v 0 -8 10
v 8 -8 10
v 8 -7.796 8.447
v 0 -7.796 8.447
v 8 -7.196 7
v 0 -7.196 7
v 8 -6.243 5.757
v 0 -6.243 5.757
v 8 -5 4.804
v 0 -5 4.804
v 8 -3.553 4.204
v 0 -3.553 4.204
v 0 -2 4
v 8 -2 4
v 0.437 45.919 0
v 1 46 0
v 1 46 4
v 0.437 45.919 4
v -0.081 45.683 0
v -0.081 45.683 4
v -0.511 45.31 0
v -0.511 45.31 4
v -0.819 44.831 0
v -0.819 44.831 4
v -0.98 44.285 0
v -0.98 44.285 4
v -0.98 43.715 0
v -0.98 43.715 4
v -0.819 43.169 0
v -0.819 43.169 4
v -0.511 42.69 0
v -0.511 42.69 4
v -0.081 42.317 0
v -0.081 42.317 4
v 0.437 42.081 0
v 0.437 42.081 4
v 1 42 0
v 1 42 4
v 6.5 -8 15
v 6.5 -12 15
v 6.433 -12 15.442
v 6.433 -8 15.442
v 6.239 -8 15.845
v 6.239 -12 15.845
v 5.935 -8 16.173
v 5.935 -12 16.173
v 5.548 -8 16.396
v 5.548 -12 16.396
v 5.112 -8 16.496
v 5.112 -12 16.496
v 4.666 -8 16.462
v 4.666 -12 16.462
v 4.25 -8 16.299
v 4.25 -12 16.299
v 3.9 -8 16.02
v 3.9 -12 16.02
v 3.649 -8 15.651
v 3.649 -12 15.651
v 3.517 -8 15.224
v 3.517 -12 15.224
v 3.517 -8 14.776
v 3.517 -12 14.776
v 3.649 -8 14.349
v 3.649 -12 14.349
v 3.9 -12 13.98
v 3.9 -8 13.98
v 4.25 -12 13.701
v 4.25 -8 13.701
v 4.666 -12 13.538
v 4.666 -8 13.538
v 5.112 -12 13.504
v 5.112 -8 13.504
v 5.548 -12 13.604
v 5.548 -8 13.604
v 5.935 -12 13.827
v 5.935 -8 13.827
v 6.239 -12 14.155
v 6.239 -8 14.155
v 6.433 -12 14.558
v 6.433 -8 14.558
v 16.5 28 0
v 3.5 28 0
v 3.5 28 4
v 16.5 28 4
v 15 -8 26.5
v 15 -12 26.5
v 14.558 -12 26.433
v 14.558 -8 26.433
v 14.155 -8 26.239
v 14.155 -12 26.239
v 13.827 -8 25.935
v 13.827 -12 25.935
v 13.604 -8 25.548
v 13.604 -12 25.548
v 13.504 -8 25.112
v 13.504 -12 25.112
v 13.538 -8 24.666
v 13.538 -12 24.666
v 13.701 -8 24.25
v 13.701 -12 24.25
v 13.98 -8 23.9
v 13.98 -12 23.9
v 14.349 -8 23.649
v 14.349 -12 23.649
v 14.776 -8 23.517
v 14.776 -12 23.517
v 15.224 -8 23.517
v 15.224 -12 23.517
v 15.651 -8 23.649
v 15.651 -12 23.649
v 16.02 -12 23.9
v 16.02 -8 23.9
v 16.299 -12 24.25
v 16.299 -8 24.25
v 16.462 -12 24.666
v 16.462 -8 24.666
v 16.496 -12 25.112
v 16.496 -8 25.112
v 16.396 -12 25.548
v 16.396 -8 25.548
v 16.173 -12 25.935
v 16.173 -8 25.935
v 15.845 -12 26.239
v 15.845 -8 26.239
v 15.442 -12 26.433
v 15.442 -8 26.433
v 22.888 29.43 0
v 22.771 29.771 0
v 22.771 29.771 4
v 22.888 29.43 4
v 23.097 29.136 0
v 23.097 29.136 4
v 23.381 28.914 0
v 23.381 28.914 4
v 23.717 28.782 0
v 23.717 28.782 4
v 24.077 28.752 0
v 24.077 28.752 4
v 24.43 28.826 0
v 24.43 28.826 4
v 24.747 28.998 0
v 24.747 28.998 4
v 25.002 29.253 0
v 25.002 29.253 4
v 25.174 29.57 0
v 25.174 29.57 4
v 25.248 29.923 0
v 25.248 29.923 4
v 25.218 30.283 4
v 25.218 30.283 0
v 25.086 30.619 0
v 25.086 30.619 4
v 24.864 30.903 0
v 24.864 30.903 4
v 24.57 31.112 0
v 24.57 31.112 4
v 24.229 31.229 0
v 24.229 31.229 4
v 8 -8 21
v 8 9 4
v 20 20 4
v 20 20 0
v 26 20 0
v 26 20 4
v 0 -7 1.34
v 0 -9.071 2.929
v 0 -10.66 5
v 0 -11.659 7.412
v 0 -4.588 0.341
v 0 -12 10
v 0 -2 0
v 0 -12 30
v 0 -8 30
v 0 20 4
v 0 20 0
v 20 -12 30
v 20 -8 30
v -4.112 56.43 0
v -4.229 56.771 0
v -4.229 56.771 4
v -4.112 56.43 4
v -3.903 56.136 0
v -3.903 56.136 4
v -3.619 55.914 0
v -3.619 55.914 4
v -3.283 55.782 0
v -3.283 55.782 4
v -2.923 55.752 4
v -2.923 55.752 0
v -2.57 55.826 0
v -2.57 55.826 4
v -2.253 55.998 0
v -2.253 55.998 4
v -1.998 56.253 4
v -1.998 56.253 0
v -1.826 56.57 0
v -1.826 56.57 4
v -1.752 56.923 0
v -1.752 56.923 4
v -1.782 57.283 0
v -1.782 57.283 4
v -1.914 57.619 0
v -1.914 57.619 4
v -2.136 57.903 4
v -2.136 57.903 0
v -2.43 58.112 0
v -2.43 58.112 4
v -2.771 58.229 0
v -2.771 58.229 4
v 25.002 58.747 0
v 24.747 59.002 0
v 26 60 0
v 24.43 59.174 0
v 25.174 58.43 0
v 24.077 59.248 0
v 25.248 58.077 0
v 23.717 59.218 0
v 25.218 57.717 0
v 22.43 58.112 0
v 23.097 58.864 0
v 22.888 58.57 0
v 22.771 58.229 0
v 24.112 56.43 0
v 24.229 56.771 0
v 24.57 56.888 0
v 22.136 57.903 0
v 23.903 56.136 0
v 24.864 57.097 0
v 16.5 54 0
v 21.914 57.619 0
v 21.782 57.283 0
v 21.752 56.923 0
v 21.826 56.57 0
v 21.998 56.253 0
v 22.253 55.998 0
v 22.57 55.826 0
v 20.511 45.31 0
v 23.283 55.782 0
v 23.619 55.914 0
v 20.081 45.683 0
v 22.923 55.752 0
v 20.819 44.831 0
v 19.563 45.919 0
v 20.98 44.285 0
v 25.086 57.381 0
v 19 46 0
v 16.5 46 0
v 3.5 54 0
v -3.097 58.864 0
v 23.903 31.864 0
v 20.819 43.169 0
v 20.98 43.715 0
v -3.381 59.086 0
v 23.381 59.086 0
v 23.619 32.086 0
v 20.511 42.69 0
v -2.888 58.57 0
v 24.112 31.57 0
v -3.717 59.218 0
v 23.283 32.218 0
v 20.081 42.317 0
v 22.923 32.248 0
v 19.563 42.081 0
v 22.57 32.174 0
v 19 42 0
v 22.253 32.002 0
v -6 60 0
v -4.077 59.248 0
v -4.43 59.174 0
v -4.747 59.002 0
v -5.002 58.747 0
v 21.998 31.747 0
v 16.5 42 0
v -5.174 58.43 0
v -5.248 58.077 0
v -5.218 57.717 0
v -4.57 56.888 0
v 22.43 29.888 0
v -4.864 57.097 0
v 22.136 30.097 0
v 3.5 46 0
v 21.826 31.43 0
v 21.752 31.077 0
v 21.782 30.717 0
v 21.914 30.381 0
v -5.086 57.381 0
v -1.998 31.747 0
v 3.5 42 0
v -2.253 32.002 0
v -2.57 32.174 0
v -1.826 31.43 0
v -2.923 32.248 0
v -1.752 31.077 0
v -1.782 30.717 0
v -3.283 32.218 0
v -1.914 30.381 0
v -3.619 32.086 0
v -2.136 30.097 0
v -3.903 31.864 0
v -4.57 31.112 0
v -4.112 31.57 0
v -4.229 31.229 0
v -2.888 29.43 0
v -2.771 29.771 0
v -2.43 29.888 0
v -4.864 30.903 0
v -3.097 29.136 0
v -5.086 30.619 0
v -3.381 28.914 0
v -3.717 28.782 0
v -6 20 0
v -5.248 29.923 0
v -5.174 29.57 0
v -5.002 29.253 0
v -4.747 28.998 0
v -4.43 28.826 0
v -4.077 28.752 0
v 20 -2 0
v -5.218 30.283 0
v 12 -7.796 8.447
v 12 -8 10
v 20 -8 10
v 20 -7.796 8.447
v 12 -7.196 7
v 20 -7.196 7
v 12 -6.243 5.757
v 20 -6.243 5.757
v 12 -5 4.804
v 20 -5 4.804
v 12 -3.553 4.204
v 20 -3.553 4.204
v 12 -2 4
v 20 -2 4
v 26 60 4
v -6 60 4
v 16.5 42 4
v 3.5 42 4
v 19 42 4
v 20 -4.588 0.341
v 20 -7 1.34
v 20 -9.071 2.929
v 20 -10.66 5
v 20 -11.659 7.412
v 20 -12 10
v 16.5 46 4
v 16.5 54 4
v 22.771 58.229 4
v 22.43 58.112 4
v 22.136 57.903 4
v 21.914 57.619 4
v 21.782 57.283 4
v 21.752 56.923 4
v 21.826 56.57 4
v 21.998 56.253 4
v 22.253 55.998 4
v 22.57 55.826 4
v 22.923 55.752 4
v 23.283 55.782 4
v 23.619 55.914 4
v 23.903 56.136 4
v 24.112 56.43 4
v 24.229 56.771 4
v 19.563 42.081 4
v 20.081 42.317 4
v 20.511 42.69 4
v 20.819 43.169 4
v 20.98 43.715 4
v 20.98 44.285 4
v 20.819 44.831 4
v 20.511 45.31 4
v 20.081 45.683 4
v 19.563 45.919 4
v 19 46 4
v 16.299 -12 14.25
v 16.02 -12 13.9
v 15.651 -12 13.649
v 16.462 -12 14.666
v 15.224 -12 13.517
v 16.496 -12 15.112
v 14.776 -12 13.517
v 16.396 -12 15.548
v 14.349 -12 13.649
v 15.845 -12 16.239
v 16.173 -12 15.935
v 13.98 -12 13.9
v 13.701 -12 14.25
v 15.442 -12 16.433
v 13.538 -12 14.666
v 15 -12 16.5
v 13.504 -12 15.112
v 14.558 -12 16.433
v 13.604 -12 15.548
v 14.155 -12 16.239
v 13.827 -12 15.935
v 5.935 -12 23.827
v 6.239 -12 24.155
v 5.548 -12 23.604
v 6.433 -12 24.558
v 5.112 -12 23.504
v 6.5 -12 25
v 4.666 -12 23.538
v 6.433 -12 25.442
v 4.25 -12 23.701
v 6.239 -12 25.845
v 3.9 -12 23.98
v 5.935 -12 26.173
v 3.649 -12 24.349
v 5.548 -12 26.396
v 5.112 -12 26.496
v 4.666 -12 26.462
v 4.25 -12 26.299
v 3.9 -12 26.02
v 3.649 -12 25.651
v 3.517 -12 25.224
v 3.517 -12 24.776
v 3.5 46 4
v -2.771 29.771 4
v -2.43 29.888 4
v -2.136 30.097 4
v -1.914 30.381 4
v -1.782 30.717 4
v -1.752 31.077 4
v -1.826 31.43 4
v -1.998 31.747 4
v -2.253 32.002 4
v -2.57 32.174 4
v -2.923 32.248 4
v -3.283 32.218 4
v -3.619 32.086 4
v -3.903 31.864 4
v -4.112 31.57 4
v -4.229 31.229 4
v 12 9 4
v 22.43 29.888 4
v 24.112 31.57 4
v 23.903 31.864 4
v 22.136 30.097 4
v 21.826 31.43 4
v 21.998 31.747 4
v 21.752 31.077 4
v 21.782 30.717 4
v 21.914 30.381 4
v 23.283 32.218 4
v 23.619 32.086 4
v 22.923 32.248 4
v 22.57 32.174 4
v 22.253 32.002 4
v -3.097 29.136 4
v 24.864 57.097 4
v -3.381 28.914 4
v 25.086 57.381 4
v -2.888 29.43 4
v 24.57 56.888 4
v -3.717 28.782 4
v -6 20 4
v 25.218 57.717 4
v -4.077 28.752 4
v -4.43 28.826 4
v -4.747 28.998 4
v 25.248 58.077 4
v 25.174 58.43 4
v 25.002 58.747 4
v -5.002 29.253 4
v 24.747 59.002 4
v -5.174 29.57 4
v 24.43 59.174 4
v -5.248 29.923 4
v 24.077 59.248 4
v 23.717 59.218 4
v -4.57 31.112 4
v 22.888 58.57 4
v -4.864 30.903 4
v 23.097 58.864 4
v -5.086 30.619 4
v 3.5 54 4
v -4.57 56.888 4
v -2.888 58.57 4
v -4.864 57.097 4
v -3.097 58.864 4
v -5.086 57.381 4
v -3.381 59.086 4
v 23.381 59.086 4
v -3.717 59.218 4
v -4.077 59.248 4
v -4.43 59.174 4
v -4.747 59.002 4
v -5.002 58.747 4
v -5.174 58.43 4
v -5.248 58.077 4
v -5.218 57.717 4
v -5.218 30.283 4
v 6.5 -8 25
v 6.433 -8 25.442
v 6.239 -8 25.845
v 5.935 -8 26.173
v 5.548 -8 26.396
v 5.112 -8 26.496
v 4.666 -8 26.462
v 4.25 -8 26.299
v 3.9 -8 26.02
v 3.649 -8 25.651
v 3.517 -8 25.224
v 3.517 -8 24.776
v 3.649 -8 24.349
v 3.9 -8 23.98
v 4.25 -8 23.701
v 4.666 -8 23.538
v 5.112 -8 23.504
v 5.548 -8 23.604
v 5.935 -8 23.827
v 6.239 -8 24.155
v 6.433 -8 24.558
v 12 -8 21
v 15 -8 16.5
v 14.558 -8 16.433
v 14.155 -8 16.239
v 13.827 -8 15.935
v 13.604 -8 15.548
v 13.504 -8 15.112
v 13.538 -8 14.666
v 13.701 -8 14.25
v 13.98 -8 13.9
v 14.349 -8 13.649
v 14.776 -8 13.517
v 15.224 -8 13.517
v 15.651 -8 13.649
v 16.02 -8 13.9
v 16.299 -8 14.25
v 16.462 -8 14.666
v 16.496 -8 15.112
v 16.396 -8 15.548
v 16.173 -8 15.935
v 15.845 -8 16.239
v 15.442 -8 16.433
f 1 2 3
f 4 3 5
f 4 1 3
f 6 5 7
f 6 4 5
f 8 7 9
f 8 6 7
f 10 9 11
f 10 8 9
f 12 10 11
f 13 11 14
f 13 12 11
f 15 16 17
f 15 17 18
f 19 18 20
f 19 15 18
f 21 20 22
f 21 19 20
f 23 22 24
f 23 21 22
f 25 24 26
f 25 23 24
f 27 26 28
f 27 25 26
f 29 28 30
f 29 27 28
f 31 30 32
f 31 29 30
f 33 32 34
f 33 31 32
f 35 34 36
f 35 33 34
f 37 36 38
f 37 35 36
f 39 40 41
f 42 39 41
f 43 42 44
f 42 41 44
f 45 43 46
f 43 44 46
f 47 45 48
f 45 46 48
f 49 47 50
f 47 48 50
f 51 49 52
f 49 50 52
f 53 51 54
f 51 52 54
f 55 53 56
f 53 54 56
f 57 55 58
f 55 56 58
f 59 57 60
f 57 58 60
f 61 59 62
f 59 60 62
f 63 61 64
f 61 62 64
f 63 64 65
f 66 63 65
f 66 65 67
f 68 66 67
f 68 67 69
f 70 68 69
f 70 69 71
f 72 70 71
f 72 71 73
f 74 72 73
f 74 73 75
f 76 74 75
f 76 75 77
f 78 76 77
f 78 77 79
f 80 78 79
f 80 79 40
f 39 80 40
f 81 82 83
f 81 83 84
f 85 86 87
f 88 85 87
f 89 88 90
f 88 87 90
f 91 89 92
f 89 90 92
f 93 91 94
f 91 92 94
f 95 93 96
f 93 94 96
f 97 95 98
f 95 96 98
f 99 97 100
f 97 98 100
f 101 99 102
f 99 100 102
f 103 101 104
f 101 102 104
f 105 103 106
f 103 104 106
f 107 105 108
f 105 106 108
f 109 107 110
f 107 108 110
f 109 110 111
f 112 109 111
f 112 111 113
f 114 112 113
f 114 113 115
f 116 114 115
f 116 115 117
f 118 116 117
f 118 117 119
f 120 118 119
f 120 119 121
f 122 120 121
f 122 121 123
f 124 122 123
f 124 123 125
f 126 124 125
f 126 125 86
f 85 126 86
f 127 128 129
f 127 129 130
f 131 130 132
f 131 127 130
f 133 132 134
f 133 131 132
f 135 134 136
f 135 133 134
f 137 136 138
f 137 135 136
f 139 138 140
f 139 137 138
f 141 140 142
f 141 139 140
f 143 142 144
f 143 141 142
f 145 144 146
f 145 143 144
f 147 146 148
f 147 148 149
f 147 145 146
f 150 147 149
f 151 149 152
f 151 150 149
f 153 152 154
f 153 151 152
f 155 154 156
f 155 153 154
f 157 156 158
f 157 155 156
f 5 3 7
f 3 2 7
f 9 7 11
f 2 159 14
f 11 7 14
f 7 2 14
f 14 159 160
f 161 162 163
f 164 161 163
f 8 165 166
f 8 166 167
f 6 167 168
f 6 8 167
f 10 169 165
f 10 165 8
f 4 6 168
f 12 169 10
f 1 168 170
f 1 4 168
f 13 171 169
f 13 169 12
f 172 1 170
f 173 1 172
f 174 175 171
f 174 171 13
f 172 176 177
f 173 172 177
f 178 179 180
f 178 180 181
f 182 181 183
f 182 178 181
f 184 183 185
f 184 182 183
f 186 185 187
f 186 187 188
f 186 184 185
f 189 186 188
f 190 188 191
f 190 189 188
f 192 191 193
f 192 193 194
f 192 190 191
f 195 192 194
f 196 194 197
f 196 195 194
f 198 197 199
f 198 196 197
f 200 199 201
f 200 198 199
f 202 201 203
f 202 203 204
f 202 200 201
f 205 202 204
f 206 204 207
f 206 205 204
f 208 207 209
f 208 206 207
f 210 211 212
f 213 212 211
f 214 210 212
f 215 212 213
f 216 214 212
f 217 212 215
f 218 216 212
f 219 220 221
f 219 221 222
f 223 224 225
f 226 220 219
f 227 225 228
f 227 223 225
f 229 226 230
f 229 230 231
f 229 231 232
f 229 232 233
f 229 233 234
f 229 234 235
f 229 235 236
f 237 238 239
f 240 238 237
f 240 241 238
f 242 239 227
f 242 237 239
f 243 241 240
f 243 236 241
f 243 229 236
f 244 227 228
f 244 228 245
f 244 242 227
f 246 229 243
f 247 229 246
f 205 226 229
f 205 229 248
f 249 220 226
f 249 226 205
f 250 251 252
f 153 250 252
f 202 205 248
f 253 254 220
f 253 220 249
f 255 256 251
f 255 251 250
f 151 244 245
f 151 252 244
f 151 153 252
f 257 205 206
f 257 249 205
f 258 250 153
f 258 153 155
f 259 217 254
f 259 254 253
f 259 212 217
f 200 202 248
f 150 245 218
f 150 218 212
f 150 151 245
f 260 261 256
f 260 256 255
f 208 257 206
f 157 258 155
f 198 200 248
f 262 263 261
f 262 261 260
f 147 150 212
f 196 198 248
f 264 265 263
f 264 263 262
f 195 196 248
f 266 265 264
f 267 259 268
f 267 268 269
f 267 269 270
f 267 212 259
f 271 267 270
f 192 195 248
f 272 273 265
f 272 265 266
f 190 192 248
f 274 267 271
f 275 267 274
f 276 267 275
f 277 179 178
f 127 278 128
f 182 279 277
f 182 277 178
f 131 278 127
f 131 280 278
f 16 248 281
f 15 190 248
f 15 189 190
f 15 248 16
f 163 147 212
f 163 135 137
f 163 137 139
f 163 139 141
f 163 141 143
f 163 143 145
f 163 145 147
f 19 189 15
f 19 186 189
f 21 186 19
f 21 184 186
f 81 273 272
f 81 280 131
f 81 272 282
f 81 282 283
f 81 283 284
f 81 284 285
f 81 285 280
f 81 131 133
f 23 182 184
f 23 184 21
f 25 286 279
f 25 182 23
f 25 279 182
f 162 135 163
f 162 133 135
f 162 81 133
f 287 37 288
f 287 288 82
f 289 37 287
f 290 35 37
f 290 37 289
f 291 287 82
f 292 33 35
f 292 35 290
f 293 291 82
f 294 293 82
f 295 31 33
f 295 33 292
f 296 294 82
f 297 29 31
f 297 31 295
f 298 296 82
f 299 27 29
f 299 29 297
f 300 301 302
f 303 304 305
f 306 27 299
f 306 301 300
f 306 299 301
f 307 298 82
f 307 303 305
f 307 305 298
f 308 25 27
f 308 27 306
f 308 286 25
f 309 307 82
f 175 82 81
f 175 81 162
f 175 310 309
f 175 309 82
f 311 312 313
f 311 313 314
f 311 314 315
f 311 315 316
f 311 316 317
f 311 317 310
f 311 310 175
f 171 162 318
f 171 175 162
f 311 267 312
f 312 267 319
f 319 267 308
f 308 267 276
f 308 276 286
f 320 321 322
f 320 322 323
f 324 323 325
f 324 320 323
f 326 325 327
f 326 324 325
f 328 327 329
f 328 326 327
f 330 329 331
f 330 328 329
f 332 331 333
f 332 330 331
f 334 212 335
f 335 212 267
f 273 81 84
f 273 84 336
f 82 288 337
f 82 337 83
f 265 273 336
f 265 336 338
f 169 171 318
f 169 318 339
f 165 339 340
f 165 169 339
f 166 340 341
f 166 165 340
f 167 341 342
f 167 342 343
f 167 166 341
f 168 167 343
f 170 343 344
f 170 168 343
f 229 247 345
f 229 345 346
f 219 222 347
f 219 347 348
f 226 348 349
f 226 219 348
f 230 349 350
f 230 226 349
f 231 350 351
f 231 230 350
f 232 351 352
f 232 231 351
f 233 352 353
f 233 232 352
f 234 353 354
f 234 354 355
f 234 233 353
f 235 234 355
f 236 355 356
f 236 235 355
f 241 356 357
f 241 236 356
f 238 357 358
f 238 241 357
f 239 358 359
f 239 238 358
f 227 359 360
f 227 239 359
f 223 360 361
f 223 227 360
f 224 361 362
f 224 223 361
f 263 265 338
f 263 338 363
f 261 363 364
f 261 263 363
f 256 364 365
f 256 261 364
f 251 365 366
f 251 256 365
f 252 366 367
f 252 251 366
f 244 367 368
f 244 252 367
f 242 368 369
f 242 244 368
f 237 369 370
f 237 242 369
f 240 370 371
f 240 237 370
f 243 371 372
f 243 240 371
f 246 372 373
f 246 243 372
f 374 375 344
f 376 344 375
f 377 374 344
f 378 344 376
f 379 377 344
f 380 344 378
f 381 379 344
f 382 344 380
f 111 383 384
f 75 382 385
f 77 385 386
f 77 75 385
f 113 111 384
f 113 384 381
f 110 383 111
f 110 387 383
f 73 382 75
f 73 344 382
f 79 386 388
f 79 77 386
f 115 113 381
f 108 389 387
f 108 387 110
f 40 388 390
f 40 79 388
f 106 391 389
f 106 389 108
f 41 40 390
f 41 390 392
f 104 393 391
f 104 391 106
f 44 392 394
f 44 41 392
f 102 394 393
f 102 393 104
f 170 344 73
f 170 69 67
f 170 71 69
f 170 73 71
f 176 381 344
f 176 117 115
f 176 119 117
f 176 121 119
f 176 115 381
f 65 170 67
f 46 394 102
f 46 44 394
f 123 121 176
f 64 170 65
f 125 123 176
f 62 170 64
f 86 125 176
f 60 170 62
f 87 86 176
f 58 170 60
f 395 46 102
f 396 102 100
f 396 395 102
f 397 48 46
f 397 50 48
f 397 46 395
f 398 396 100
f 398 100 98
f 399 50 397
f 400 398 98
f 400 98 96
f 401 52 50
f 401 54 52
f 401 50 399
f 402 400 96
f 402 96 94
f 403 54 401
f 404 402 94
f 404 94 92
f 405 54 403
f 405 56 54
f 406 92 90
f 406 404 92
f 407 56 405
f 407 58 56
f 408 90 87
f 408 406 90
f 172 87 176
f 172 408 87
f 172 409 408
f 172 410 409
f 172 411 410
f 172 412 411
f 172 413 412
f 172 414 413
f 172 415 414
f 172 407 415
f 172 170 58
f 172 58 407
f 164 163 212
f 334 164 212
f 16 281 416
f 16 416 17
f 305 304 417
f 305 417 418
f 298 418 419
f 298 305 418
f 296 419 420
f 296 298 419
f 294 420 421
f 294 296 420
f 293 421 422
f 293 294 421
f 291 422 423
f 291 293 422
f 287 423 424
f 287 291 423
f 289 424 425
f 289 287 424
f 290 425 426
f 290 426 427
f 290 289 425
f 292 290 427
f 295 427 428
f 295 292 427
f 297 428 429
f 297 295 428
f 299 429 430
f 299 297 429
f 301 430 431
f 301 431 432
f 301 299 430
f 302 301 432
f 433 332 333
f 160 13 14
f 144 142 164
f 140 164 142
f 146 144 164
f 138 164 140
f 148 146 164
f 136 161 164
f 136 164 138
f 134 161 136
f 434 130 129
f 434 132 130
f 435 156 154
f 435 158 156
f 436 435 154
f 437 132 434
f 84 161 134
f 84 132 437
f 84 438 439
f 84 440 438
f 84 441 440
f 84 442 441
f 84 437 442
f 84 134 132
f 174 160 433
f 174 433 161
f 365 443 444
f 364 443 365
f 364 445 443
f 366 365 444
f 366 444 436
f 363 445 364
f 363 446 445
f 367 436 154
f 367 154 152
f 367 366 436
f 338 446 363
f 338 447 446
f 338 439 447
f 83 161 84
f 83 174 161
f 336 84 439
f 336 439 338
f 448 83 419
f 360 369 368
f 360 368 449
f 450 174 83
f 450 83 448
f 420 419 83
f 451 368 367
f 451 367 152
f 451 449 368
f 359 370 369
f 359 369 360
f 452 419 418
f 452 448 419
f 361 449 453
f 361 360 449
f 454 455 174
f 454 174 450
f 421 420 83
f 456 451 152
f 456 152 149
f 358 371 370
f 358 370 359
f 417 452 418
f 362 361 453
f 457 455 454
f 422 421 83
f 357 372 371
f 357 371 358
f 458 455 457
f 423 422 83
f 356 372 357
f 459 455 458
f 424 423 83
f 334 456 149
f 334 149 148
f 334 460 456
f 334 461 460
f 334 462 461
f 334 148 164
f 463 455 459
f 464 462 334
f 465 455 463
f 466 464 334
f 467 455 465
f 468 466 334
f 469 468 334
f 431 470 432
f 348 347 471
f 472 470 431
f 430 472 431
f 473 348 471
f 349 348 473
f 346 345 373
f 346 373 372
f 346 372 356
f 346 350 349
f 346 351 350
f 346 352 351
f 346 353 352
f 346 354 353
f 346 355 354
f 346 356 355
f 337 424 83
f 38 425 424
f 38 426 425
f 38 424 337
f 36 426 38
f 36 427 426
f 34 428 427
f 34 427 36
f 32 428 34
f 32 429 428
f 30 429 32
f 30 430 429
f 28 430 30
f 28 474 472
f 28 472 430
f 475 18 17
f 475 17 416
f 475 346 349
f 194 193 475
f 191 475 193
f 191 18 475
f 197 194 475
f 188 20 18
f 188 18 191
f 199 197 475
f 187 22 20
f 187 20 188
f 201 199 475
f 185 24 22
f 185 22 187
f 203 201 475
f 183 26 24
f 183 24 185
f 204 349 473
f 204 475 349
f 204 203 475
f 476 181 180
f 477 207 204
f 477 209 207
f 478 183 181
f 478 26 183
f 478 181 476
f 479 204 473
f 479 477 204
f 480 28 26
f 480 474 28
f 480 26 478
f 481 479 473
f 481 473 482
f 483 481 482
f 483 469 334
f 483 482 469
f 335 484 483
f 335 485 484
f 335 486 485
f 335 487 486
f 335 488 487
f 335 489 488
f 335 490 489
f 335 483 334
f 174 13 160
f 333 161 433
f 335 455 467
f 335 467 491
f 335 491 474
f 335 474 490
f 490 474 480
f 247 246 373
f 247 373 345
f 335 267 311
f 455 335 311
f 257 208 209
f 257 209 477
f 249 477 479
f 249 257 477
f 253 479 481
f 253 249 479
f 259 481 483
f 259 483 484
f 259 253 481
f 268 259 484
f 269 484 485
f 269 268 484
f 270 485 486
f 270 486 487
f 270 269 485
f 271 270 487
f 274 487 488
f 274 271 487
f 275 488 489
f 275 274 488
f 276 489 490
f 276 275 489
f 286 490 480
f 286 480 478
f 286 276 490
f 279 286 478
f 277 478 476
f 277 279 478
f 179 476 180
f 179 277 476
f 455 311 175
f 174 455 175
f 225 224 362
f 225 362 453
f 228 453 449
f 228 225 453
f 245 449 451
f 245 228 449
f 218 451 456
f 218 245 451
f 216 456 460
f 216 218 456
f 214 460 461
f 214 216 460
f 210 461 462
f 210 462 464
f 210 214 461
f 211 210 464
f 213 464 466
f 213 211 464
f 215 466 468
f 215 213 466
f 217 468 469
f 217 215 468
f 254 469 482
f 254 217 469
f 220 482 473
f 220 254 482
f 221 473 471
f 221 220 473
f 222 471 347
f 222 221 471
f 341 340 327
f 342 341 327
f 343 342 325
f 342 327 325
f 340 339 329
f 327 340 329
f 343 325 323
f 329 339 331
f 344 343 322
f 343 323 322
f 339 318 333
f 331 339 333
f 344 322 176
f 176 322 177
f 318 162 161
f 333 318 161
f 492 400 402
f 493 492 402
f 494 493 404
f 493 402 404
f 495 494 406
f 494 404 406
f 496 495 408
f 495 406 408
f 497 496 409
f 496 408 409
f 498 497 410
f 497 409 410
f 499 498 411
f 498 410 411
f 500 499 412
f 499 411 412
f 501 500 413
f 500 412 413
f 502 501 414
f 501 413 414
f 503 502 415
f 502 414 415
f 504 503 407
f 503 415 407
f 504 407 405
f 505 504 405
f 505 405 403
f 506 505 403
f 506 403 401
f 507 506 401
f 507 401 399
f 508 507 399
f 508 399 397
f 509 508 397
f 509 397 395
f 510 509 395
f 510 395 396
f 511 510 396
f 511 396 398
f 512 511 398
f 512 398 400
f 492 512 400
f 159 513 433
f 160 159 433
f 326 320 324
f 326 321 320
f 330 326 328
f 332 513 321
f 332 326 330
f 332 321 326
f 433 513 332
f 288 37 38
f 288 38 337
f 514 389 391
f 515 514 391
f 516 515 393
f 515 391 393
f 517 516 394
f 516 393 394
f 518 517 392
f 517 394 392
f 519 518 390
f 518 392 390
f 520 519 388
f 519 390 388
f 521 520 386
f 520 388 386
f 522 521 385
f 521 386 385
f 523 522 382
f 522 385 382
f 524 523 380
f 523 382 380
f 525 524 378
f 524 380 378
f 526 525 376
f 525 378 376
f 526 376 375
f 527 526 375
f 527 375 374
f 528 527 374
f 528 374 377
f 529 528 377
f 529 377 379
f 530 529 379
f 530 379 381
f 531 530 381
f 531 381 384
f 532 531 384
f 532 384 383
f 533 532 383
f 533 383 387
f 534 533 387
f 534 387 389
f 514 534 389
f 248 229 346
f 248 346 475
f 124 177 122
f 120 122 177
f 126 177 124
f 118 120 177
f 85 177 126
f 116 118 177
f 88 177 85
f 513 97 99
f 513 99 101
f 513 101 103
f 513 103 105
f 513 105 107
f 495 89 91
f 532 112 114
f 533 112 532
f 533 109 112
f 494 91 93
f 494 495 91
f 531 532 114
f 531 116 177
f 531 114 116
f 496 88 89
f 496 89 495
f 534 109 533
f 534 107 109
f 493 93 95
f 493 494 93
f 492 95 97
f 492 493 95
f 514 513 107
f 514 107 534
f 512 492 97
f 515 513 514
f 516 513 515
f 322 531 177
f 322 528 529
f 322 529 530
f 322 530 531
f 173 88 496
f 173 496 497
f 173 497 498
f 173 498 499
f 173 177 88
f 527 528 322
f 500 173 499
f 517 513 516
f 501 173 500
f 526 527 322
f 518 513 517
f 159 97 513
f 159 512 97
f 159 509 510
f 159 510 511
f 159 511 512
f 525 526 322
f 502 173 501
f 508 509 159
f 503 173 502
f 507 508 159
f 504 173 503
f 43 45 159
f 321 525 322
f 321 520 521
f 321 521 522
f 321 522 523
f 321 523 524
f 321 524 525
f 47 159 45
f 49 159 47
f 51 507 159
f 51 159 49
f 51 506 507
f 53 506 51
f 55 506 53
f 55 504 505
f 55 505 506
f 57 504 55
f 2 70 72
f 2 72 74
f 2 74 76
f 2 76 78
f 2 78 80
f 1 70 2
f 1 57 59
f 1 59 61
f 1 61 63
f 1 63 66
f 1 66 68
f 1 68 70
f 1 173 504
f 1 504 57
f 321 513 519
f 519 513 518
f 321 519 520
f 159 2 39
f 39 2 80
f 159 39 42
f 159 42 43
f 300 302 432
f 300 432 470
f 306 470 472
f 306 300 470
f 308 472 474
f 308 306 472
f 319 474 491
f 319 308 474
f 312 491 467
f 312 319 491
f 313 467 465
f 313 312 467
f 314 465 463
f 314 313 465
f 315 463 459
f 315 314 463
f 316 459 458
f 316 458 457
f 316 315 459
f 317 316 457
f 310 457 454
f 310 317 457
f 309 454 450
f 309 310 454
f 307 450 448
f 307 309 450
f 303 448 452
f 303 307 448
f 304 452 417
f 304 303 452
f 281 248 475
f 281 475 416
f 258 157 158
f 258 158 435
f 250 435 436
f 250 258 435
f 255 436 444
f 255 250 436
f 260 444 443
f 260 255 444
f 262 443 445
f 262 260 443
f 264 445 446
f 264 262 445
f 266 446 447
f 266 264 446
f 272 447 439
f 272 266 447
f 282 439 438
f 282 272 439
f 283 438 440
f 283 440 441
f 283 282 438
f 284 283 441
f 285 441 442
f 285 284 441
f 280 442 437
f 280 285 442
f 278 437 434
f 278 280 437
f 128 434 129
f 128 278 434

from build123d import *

# Parameters (mm, degrees)
EXTRUDE_1_DEPTH     = 4
EXTRUDE_3_DEPTH     = 20
RIB_1_REACH         = 70.964
SKETCH_5_WALL_W     = 163.463051102
SKETCH_5_WALL_H     = 4
SKETCH_6_R          = 1.5
CUT_EXTRUDE_3_DEPTH = 10


with BuildPart() as part:
    # 草图1 → 凸台-拉伸1 (new body)
    with BuildSketch(Plane.XY):
        Polygon((0, 20), (0, 0), (20, 0), (20, 20), (26, 20), (26, 60), (-6, 60), (-6, 20), align=None)
        with BuildLine():
            Line((3.5, 54), (3.5, 46))
            Line((3.5, 46), (1, 46))
            ThreePointArc((1, 46), (-1, 44), (1, 42))
            Line((1, 42), (3.5, 42))
            Line((3.5, 42), (3.5, 28))
            Line((3.5, 28), (16.5, 28))
            Line((16.5, 28), (16.5, 42))
            Line((16.5, 42), (19, 42))
            ThreePointArc((19, 42), (21, 44), (19, 46))
            Line((19, 46), (16.5, 46))
            Line((16.5, 46), (16.5, 54))
            Line((16.5, 54), (3.5, 54))
        make_face(mode=Mode.SUBTRACT)
        with BuildLine():
            ThreePointArc((24.228868987, 56.771131013), (24.883883476, 58.883883476), (22.771131013, 58.228868987))
            ThreePointArc((22.771131013, 58.228868987), (22.116116524, 56.116116524), (24.228868987, 56.771131013))
        make_face(mode=Mode.SUBTRACT)
        with BuildLine():
            ThreePointArc((24.228868987, 31.228868987), (22.116116524, 31.883883476), (22.771131013, 29.771131013))
            ThreePointArc((22.771131013, 29.771131013), (24.883883476, 29.116116524), (24.228868987, 31.228868987))
        make_face(mode=Mode.SUBTRACT)
        with BuildLine():
            ThreePointArc((-4.228868987, 31.228868987), (-4.883883476, 29.116116524), (-2.771131013, 29.771131013))
            ThreePointArc((-2.771131013, 29.771131013), (-2.116116524, 31.883883476), (-4.228868987, 31.228868987))
        make_face(mode=Mode.SUBTRACT)
        with BuildLine():
            ThreePointArc((-2.771131013, 58.228868987), (-4.883883476, 58.883883476), (-4.228868987, 56.771131013))
            ThreePointArc((-4.228868987, 56.771131013), (-2.116116524, 56.116116524), (-2.771131013, 58.228868987))
        make_face(mode=Mode.SUBTRACT)
    extrude(amount=EXTRUDE_1_DEPTH)

    # 草图4 → 凸台-拉伸3 (add)
    with BuildSketch(Plane.ZY):
        with BuildLine():
            Line((0, 0), (0, -2))
            ThreePointArc((0, -2), (2.928932188, -9.071067812), (10, -12))
            Line((10, -12), (30, -12))
            Line((30, -12), (30, -8))
            Line((30, -8), (10, -8))
            ThreePointArc((10, -8), (5.757359313, -6.242640687), (4, -2))
            Line((4, -2), (4, 0))
            Line((4, 0), (0, 0))
        make_face()
    extrude(amount=-EXTRUDE_3_DEPTH)

    # 草图5 wall → 筋1 (add, up to next)
    with BuildSketch(Plane(origin=(10, 0.678932188, 12.321067812), x_dir=(0, 0.707106781187, -0.707106781187), z_dir=(0, -0.707106781187, -0.707106781187)), mode=Mode.PRIVATE) as rib_1_sk1:
        Rectangle(SKETCH_5_WALL_W, SKETCH_5_WALL_H)
    rib_1_tool1 = extrude(rib_1_sk1.sketch, amount=RIB_1_REACH, mode=Mode.PRIVATE) - part.part
    add(rib_1_tool1.solids().sort_by_distance((10, 0.678932188, 12.321067812))[0])

    # 草图6 → 切除-拉伸3 (cut)
    with BuildSketch(Plane.XZ.offset(12)):
        with Locations((5, 25)):
            Circle(SKETCH_6_R)
        with Locations((5, 15)):
            Circle(SKETCH_6_R)
        with Locations(Location((15, 15, 0), (0, 0, 90))):
            Circle(SKETCH_6_R)
        with Locations(Location((15, 25, 0), (0, 0, 90))):
            Circle(SKETCH_6_R)
    extrude(amount=-CUT_EXTRUDE_3_DEPTH, mode=Mode.SUBTRACT)


solid = part.part
